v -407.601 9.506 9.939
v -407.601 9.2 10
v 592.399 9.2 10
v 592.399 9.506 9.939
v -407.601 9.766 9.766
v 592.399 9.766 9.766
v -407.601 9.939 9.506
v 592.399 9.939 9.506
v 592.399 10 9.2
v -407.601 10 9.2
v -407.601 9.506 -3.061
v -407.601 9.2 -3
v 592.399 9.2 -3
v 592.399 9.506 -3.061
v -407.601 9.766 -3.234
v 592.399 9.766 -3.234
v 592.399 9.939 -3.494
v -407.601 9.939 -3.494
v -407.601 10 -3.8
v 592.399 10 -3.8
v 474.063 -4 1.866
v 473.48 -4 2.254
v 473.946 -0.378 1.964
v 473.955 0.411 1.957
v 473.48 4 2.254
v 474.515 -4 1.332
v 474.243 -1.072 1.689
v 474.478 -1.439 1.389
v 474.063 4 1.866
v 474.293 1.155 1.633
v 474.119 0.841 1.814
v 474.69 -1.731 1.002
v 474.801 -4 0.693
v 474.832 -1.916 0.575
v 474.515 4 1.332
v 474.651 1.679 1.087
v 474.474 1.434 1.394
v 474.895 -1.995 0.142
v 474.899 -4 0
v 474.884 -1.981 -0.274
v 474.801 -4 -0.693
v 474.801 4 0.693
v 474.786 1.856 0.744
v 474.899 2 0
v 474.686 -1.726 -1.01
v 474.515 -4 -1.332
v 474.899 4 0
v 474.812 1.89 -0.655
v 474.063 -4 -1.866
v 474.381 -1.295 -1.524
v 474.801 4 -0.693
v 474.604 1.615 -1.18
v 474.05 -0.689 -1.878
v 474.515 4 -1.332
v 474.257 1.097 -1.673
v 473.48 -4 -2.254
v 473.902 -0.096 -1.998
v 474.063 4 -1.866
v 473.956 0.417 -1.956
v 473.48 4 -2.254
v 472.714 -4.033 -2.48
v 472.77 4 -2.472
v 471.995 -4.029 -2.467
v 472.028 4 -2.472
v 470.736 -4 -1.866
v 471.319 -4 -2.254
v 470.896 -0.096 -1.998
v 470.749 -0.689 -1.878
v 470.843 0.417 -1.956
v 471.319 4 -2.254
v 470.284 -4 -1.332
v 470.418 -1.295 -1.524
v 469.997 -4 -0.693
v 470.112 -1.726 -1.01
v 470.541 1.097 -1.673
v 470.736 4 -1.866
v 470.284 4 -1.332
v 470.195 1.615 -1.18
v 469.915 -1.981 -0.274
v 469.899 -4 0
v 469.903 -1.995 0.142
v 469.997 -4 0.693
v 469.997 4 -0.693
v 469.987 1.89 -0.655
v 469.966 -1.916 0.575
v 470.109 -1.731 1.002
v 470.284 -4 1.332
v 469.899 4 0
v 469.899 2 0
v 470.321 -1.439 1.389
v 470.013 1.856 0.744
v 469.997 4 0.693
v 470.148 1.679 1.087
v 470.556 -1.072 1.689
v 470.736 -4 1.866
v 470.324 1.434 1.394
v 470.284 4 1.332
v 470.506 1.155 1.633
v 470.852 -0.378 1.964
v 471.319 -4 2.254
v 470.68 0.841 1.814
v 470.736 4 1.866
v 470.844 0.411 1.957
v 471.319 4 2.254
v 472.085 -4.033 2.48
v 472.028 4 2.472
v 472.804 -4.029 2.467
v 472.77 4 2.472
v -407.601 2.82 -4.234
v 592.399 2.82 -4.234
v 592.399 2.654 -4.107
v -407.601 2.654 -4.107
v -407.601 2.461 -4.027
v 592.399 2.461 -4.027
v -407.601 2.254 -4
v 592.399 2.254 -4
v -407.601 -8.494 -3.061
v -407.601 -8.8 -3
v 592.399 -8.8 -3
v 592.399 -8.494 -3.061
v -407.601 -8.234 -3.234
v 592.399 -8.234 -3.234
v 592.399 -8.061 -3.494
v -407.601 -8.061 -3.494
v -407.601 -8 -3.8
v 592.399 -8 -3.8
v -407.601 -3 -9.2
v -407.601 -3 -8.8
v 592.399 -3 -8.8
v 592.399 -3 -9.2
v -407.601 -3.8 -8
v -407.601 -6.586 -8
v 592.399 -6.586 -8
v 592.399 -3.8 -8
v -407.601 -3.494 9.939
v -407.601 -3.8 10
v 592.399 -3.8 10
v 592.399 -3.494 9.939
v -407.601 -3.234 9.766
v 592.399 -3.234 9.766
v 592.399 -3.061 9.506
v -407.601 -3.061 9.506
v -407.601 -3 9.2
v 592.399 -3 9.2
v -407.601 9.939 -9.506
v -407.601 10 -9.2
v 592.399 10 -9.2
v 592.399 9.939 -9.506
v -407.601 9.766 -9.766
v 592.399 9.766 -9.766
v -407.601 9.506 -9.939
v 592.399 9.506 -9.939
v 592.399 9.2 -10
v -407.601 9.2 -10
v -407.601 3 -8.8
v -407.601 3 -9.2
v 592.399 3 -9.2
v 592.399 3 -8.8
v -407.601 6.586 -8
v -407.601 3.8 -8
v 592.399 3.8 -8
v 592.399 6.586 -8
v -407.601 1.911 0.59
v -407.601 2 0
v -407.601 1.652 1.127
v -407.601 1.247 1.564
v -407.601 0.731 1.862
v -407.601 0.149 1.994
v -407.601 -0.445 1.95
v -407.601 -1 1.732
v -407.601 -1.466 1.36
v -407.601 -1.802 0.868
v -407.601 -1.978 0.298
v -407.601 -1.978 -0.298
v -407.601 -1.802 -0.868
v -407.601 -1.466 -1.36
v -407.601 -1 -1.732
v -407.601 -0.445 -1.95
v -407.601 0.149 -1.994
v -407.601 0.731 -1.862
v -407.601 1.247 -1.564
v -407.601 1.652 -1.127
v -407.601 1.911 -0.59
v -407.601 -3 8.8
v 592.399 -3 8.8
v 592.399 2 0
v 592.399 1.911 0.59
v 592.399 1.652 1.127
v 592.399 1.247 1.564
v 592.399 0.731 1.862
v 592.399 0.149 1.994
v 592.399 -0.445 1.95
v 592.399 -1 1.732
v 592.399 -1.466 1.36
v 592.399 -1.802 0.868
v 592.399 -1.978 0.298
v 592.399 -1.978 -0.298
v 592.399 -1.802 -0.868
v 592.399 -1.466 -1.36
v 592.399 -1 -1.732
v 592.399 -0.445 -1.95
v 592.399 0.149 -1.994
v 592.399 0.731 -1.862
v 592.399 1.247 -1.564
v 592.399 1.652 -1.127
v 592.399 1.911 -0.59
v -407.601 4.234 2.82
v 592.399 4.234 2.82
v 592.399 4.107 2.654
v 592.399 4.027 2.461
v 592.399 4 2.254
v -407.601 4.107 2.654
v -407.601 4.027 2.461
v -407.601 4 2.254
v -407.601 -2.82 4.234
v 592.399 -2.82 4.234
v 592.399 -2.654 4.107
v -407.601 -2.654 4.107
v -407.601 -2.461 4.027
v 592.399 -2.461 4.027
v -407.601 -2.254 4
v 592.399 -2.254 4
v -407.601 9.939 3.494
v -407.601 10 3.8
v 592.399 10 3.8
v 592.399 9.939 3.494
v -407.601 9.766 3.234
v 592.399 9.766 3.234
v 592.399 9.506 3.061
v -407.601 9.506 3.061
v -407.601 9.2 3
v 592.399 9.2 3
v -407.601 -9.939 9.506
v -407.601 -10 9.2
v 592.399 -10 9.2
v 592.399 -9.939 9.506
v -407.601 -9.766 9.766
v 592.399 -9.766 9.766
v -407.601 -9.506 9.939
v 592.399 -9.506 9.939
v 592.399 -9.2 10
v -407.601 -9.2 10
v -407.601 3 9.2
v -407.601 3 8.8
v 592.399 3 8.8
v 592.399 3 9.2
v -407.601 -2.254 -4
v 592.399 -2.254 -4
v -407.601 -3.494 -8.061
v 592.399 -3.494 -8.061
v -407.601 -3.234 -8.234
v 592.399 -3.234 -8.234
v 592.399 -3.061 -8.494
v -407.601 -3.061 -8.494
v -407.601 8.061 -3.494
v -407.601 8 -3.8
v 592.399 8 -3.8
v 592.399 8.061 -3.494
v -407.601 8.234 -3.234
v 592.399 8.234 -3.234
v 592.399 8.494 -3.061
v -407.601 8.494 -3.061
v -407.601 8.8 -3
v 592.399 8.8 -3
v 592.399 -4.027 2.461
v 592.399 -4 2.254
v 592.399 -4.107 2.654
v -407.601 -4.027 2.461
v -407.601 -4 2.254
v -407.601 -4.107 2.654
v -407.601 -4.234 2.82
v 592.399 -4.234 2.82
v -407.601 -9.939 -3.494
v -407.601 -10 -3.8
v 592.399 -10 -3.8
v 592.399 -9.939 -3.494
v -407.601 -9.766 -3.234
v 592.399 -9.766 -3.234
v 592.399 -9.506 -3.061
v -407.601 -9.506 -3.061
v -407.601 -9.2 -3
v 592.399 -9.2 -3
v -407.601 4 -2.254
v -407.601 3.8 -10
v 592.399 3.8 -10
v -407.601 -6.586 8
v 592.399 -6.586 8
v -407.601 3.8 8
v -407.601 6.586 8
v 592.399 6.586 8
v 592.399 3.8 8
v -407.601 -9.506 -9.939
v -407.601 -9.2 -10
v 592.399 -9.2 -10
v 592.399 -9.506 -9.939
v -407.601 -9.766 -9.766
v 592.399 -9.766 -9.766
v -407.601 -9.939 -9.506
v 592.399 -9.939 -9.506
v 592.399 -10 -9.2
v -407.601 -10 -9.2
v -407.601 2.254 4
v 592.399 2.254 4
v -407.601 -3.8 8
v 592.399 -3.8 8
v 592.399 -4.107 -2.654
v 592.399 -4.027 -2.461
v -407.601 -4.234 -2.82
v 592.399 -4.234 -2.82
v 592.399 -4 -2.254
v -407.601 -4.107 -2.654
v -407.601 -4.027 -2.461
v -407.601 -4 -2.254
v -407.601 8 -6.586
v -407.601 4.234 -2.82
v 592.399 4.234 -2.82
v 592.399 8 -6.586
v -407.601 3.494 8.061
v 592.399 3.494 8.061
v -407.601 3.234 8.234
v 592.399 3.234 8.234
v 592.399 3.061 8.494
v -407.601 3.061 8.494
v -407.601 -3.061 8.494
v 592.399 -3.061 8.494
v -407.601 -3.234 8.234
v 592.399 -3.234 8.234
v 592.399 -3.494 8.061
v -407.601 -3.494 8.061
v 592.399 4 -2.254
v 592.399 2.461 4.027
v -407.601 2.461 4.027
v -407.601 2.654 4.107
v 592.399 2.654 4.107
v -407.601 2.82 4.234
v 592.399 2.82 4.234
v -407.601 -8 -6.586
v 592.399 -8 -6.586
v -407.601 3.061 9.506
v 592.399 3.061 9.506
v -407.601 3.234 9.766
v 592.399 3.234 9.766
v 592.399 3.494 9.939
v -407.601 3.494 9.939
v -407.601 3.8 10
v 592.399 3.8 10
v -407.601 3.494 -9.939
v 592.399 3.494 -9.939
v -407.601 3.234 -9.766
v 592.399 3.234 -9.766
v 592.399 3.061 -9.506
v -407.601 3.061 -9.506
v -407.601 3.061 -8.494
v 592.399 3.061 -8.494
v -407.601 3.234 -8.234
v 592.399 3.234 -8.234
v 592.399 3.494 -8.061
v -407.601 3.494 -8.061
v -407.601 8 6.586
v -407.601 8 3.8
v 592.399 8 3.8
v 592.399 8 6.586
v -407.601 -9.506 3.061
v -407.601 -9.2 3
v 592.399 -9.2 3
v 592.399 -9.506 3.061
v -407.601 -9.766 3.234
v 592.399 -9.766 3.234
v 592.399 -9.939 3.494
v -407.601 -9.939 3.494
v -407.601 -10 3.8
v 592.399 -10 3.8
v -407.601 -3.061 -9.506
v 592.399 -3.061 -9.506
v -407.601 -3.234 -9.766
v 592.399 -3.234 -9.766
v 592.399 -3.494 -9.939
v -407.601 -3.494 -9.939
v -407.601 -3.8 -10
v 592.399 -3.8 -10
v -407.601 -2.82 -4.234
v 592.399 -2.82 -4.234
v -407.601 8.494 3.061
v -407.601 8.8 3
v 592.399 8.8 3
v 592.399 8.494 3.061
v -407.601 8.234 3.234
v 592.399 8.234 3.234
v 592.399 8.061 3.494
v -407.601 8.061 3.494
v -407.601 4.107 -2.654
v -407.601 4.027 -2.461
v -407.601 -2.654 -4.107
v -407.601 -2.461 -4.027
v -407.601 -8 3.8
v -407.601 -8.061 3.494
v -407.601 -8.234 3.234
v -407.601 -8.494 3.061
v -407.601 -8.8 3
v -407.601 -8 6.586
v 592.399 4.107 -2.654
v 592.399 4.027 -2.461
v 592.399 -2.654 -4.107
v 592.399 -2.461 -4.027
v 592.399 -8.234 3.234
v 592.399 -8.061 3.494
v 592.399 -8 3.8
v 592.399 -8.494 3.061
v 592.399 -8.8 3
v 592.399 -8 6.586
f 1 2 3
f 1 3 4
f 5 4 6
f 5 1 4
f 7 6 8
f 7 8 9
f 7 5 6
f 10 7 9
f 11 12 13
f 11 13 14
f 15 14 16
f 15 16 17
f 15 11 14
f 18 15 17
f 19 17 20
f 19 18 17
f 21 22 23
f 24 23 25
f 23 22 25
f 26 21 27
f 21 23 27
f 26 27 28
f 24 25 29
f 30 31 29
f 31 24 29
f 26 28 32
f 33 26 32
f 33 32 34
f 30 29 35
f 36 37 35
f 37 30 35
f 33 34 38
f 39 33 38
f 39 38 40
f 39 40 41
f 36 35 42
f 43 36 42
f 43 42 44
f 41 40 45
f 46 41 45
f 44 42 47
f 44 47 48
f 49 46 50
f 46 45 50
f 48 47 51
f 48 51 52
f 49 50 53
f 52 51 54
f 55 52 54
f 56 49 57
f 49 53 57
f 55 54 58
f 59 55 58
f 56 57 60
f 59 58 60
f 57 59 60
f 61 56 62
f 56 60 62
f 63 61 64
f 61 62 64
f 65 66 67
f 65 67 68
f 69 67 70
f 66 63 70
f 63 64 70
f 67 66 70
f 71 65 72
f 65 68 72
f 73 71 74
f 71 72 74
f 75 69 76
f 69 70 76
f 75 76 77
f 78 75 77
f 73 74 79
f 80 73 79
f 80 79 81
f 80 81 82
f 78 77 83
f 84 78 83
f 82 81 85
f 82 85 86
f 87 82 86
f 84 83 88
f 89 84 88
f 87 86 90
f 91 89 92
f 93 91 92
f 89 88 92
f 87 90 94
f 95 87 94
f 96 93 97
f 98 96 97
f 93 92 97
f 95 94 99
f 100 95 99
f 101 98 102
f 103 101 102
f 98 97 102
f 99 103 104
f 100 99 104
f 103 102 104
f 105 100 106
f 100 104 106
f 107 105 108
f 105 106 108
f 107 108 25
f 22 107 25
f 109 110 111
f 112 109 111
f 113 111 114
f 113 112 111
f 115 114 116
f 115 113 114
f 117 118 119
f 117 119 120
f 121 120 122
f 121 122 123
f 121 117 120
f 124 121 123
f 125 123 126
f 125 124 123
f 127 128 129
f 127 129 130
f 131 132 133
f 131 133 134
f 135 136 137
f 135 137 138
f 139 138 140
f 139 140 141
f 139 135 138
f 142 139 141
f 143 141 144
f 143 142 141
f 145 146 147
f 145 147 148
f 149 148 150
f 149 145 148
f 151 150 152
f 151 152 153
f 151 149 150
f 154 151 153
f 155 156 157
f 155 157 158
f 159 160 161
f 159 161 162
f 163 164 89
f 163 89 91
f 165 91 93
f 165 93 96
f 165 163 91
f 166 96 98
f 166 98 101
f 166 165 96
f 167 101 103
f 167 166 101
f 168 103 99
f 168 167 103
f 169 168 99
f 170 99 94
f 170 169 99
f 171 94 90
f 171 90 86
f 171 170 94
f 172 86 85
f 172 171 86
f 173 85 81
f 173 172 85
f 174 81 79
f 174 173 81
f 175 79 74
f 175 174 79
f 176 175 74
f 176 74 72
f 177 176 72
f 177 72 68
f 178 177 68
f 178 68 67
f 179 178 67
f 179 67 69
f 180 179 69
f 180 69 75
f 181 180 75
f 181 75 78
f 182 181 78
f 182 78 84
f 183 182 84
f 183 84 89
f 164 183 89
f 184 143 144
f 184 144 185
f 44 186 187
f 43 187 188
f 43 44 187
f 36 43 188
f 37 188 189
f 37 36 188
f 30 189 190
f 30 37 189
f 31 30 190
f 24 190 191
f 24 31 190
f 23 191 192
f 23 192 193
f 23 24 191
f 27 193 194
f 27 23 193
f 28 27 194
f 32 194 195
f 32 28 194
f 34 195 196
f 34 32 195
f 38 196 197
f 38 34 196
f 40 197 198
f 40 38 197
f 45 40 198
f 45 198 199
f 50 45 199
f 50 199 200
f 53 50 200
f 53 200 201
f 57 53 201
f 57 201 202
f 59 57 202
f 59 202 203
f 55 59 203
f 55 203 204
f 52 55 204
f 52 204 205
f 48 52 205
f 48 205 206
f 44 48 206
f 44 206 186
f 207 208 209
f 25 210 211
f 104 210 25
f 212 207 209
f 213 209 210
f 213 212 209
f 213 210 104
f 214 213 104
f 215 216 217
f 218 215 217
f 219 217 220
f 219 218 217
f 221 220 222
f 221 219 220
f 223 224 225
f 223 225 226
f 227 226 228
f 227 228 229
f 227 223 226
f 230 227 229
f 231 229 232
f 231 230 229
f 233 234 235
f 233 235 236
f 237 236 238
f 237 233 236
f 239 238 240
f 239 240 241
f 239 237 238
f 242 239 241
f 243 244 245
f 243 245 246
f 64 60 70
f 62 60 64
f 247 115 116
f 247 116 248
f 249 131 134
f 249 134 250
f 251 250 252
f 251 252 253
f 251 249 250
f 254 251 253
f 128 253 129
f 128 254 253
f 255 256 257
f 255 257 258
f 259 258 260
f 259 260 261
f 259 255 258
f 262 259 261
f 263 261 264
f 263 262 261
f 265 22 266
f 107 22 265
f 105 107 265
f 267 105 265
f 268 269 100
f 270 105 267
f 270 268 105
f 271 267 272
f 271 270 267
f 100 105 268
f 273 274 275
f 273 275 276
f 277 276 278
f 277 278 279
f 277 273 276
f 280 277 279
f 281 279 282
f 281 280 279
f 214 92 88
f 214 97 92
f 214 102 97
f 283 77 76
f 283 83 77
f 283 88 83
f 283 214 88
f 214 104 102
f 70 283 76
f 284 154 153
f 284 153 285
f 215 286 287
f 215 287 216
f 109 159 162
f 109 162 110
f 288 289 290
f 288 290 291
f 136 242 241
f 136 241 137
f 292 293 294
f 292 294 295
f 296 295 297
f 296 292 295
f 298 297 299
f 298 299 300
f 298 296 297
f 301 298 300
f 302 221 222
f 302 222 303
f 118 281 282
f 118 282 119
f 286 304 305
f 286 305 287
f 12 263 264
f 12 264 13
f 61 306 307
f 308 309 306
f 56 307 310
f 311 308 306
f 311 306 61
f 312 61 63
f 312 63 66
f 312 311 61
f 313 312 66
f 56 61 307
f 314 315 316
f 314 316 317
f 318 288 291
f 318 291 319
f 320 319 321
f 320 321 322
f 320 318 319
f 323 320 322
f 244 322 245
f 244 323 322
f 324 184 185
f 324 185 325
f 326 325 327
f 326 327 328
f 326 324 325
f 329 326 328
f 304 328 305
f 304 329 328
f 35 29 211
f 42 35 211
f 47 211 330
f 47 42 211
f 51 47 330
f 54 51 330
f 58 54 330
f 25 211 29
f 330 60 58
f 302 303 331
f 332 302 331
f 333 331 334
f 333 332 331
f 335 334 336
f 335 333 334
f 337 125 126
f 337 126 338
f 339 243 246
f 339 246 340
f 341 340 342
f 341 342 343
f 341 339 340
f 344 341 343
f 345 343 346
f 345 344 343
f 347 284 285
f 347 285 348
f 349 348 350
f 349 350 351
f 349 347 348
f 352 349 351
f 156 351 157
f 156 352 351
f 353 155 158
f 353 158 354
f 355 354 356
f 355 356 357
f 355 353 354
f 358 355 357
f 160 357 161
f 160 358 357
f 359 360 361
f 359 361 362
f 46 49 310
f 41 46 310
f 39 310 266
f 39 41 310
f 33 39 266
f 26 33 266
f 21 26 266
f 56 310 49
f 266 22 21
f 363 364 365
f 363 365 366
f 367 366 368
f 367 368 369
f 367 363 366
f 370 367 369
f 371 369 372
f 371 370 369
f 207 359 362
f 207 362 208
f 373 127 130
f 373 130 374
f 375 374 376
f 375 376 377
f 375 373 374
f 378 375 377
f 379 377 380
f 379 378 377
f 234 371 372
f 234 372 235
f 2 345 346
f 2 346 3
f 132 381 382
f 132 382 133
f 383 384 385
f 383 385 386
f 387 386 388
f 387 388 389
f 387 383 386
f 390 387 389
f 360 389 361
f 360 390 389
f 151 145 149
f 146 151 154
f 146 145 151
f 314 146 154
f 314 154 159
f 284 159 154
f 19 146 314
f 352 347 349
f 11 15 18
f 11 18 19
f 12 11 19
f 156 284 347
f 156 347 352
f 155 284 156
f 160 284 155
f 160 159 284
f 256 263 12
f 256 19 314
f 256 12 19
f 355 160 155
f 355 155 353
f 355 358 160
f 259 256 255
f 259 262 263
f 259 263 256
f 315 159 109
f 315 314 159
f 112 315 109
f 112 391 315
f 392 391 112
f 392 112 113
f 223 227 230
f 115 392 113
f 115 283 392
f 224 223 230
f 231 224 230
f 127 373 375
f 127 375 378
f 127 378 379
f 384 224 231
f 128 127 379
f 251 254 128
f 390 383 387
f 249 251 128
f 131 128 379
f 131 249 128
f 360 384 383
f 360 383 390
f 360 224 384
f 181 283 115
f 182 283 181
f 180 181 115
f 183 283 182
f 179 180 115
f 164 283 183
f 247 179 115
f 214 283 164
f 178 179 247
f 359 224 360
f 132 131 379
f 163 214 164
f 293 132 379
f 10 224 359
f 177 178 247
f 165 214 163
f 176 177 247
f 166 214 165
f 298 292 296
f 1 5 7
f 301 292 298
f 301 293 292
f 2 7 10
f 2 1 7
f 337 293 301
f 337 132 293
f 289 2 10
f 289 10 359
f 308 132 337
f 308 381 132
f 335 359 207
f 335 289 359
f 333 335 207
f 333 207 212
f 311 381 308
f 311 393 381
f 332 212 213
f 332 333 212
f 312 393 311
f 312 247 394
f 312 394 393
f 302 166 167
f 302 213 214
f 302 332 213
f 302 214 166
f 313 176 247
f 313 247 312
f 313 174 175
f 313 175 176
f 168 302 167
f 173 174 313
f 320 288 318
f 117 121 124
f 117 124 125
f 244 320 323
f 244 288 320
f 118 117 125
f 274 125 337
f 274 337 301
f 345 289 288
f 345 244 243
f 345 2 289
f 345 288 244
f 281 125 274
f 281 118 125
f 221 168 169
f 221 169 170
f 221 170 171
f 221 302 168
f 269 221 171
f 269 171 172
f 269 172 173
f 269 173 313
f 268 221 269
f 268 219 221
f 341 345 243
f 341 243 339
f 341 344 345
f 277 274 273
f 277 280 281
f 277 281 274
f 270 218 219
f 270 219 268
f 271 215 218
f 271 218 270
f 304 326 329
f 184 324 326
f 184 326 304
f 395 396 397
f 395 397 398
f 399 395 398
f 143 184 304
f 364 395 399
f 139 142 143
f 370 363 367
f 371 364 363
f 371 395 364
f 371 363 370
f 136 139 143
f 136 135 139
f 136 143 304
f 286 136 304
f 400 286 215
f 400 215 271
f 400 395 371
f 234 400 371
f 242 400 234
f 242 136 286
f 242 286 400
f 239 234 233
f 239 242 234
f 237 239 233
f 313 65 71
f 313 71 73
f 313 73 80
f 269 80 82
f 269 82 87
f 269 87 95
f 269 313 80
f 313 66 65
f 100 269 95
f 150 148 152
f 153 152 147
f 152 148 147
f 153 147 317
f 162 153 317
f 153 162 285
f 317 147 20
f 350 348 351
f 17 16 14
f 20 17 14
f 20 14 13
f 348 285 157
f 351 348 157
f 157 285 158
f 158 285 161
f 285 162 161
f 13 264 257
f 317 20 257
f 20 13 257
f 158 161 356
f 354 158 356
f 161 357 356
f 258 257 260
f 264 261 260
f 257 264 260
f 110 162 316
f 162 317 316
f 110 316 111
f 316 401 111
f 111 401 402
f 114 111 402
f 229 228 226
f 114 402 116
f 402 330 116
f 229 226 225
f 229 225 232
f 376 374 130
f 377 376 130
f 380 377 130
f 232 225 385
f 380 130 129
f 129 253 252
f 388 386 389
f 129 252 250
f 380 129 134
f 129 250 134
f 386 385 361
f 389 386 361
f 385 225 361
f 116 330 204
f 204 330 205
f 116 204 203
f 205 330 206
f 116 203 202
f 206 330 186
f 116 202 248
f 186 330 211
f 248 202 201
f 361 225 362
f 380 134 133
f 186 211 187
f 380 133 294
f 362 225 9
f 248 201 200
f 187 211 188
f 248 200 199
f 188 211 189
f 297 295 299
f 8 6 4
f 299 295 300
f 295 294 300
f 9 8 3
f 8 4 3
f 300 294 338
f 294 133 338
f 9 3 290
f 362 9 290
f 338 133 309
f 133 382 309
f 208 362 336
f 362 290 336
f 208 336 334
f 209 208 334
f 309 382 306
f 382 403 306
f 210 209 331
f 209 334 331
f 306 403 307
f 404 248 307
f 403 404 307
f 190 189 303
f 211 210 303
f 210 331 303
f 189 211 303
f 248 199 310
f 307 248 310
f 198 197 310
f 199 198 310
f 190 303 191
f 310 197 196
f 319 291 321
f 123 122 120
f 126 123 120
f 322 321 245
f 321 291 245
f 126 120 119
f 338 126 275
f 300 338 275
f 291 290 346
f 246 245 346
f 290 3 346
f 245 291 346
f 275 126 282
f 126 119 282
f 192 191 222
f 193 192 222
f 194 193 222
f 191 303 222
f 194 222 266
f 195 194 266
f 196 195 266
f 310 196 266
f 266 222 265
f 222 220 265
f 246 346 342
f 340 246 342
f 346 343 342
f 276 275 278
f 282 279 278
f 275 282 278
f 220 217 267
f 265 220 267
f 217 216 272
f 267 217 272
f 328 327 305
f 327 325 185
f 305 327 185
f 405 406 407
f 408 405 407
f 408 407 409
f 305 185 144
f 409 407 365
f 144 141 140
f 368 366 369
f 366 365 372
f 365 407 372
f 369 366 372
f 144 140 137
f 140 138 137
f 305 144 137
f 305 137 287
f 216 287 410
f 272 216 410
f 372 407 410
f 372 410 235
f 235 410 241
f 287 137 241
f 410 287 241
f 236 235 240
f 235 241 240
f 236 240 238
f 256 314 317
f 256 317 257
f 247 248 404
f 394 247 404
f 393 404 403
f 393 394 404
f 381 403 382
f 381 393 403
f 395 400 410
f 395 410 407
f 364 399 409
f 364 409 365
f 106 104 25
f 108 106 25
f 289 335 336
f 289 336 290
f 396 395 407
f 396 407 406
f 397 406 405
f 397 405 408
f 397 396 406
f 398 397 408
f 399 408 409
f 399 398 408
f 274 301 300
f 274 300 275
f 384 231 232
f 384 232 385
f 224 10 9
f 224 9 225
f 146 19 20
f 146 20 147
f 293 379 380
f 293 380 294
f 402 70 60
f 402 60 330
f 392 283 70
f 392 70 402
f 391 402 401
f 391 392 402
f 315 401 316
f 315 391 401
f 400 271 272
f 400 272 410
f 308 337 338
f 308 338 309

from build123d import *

# Parameters (mm, degrees)
SKETCH1_R           = 2
PROFILE_4X4_1_DEPTH = 1000
SKETCH3_R           = 2.5
CUT_EXTRUDE1_DEPTH  = 10


with BuildPart() as part:
    # Sketch1 → Profile 4X4(1) (new body)
    with BuildSketch(Plane.YZ.offset(-407.600596125)):
        with BuildLine():
            Line((-3, 9.2), (-3, 8.8))
            ThreePointArc((-3, 8.8), (-3.234314575, 8.234314575), (-3.8, 8))
            Line((-3.8, 8), (-6.585786438, 8))
            Line((-6.585786438, 8), (-2.820101013, 4.234314575))
            ThreePointArc((-2.820101013, 4.234314575), (-2.560562334, 4.060896374), (-2.254415588, 4))
            Line((-2.254415588, 4), (2.254415588, 4))
            ThreePointArc((2.254415588, 4), (2.560562334, 4.060896374), (2.820101013, 4.234314575))
            Line((2.820101013, 4.234314575), (6.585786438, 8))
            Line((6.585786438, 8), (3.8, 8))
            ThreePointArc((3.8, 8), (3.234314575, 8.234314575), (3, 8.8))
            Line((3, 8.8), (3, 9.2))
            ThreePointArc((3, 9.2), (3.234314575, 9.765685425), (3.8, 10))
            Line((3.8, 10), (9.2, 10))
            ThreePointArc((9.2, 10), (9.765685425, 9.765685425), (10, 9.2))
            Line((10, 9.2), (10, 3.8))
            ThreePointArc((10, 3.8), (9.765685425, 3.234314575), (9.2, 3))
            Line((9.2, 3), (8.8, 3))
            ThreePointArc((8.8, 3), (8.234314575, 3.234314575), (8, 3.8))
            Line((8, 3.8), (8, 6.585786438))
            Line((8, 6.585786438), (4.234314575, 2.820101013))
            ThreePointArc((4.234314575, 2.820101013), (4.060896374, 2.560562334), (4, 2.254415588))
            Line((4, 2.254415588), (4, -2.254415588))
            ThreePointArc((4, -2.254415588), (4.060896374, -2.560562334), (4.234314575, -2.820101013))
            Line((4.234314575, -2.820101013), (8, -6.585786438))
            Line((8, -6.585786438), (8, -3.8))
            ThreePointArc((8, -3.8), (8.234314575, -3.234314575), (8.8, -3))
            Line((8.8, -3), (9.2, -3))
            ThreePointArc((9.2, -3), (9.765685425, -3.234314575), (10, -3.8))
            Line((10, -3.8), (10, -9.2))
            ThreePointArc((10, -9.2), (9.765685425, -9.765685425), (9.2, -10))
            Line((9.2, -10), (3.8, -10))
            ThreePointArc((3.8, -10), (3.234314575, -9.765685425), (3, -9.2))
            Line((3, -9.2), (3, -8.8))
            ThreePointArc((3, -8.8), (3.234314575, -8.234314575), (3.8, -8))
            Line((3.8, -8), (6.585786438, -8))
            Line((6.585786438, -8), (2.820101013, -4.234314575))
            ThreePointArc((2.820101013, -4.234314575), (2.560562334, -4.060896374), (2.254415588, -4))
            Line((2.254415588, -4), (-2.254415588, -4))
            ThreePointArc((-2.254415588, -4), (-2.560562334, -4.060896374), (-2.820101013, -4.234314575))
            Line((-2.820101013, -4.234314575), (-6.585786438, -8))
            Line((-6.585786438, -8), (-3.8, -8))
            ThreePointArc((-3.8, -8), (-3.234314575, -8.234314575), (-3, -8.8))
            Line((-3, -8.8), (-3, -9.2))
            ThreePointArc((-3, -9.2), (-3.234314575, -9.765685425), (-3.8, -10))
            Line((-3.8, -10), (-9.2, -10))
            ThreePointArc((-9.2, -10), (-9.765685425, -9.765685425), (-10, -9.2))
            Line((-10, -9.2), (-10, -3.8))
            ThreePointArc((-10, -3.8), (-9.765685425, -3.234314575), (-9.2, -3))
            Line((-9.2, -3), (-8.8, -3))
            ThreePointArc((-8.8, -3), (-8.234314575, -3.234314575), (-8, -3.8))
            Line((-8, -3.8), (-8, -6.585786438))
            Line((-8, -6.585786438), (-4.234314575, -2.820101013))
            ThreePointArc((-4.234314575, -2.820101013), (-4.060896374, -2.560562334), (-4, -2.254415588))
            Line((-4, -2.254415588), (-4, 2.254415588))
            ThreePointArc((-4, 2.254415588), (-4.060896374, 2.560562334), (-4.234314575, 2.820101013))
            Line((-4.234314575, 2.820101013), (-8, 6.585786438))
            Line((-8, 6.585786438), (-8, 3.8))
            ThreePointArc((-8, 3.8), (-8.234314575, 3.234314575), (-8.8, 3))
            Line((-8.8, 3), (-9.2, 3))
            ThreePointArc((-9.2, 3), (-9.765685425, 3.234314575), (-10, 3.8))
            Line((-10, 3.8), (-10, 9.2))
            ThreePointArc((-10, 9.2), (-9.765685425, 9.765685425), (-9.2, 10))
            Line((-9.2, 10), (-3.8, 10))
            ThreePointArc((-3.8, 10), (-3.234314575, 9.765685425), (-3, 9.2))
        make_face()
        Circle(SKETCH1_R, mode=Mode.SUBTRACT)
    extrude(amount=PROFILE_4X4_1_DEPTH)

    # Sketch3 → Cut-Extrude1 (cut)
    with BuildSketch(Plane(origin=(0, 4, 0), x_dir=(1, 0, 0), z_dir=(0, 1, 0))):
        with Locations(Location((472.399403875, 0, 0), (0, 0, 295.608789007))):
            Circle(SKETCH3_R)
    extrude(amount=-CUT_EXTRUDE1_DEPTH, mode=Mode.SUBTRACT)


solid = part.part
